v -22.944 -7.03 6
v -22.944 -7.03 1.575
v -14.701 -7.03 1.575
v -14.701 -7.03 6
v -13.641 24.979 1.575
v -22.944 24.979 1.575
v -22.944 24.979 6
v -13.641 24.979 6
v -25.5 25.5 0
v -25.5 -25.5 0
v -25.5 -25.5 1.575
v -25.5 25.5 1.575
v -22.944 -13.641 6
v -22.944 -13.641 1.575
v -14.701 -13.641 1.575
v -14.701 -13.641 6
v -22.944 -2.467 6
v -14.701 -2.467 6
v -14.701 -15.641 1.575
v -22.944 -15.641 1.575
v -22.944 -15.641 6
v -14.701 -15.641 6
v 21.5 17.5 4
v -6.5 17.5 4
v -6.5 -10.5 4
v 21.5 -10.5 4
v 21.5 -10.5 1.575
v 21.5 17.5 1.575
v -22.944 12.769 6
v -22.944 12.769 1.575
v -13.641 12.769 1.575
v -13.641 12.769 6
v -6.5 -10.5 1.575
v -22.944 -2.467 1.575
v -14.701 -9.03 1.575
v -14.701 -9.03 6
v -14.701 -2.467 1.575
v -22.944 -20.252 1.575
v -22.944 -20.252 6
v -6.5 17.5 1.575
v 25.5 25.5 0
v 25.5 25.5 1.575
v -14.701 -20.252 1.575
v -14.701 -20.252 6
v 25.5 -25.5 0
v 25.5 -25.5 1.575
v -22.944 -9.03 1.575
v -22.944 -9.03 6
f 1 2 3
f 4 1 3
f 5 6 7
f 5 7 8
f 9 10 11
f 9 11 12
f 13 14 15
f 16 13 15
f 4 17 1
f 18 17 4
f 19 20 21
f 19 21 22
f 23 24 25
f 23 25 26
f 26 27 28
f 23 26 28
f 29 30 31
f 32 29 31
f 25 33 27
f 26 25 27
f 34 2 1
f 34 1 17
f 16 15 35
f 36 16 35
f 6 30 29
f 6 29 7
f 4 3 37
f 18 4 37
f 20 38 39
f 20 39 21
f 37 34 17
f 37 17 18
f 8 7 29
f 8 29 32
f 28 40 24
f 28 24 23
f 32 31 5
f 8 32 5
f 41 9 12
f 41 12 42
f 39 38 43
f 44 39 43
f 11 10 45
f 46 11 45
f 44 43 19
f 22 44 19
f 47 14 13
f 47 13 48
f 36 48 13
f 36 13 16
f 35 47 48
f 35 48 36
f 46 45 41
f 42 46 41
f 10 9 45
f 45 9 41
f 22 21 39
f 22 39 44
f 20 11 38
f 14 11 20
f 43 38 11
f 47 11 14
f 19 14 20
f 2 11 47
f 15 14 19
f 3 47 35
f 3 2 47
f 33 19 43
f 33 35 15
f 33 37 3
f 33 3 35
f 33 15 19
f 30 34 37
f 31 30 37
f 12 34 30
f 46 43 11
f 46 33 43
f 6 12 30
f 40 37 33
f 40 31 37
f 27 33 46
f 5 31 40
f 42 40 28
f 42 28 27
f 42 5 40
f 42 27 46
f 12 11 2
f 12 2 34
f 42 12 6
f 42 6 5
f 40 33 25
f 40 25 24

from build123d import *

# Parameters (mm, degrees)
SKETCH1_W           = 51
SKETCH1_H           = 51
SKETCH1_W_2         = 28
SKETCH1_H_2         = 28
SKETCH1_W_3         = 9.30278776
SKETCH1_H_3         = 12.209946987
SKETCH1_W_4         = 8.24332
SKETCH1_H_4         = 4.56356538
SKETCH1_H_5         = 4.61067604
BOSS_EXTRUDE1_DEPTH = 1.5748
SKETCH1_2_W         = 28
SKETCH1_2_H         = 28
BOSS_EXTRUDE2_DEPTH = 4
SKETCH1_3_W         = 9.30278776
SKETCH1_3_H         = 12.209946987
SKETCH1_3_W_2       = 8.24332
SKETCH1_3_H_2       = 4.56356538
SKETCH1_3_H_3       = 4.61067604
BOSS_EXTRUDE3_DEPTH = 6


with BuildPart() as part:
    # Sketch1 → Boss-Extrude1 (new body)
    with BuildSketch(Plane.XY):
        Rectangle(SKETCH1_W, SKETCH1_H)
        with Locations((7.5, 3.5)):
            Rectangle(SKETCH1_W_2, SKETCH1_H_2, mode=Mode.SUBTRACT)
        with Locations((-18.29281594, 18.874000471)):
            Rectangle(SKETCH1_W_3, SKETCH1_H_3, mode=Mode.SUBTRACT)
        with Locations((-18.82254982, -4.74850311)):
            Rectangle(SKETCH1_W_4, SKETCH1_H_4, mode=Mode.SUBTRACT)
        with Locations((-18.82254982, -11.33562382)):
            Rectangle(SKETCH1_W_4, SKETCH1_H_5, mode=Mode.SUBTRACT)
        with Locations((-18.82254982, -17.94629986)):
            Rectangle(SKETCH1_W_4, SKETCH1_H_5, mode=Mode.SUBTRACT)
    extrude(amount=BOSS_EXTRUDE1_DEPTH)

    # Sketch1<2> → Boss-Extrude2 (add)
    with BuildSketch(Plane.XY):
        with Locations((7.5, 3.5)):
            Rectangle(SKETCH1_2_W, SKETCH1_2_H)
    extrude(amount=BOSS_EXTRUDE2_DEPTH)

    # Sketch1<3> → Boss-Extrude3 (add)
    with BuildSketch(Plane.XY):
        with Locations((-18.29281594, 18.874000471)):
            Rectangle(SKETCH1_3_W, SKETCH1_3_H)
        with Locations((-18.82254982, -4.74850311)):
            Rectangle(SKETCH1_3_W_2, SKETCH1_3_H_2)
        with Locations((-18.82254982, -11.33562382)):
            Rectangle(SKETCH1_3_W_2, SKETCH1_3_H_3)
        with Locations((-18.82254982, -17.94629986)):
            Rectangle(SKETCH1_3_W_2, SKETCH1_3_H_3)
    extrude(amount=BOSS_EXTRUDE3_DEPTH)


solid = part.part
